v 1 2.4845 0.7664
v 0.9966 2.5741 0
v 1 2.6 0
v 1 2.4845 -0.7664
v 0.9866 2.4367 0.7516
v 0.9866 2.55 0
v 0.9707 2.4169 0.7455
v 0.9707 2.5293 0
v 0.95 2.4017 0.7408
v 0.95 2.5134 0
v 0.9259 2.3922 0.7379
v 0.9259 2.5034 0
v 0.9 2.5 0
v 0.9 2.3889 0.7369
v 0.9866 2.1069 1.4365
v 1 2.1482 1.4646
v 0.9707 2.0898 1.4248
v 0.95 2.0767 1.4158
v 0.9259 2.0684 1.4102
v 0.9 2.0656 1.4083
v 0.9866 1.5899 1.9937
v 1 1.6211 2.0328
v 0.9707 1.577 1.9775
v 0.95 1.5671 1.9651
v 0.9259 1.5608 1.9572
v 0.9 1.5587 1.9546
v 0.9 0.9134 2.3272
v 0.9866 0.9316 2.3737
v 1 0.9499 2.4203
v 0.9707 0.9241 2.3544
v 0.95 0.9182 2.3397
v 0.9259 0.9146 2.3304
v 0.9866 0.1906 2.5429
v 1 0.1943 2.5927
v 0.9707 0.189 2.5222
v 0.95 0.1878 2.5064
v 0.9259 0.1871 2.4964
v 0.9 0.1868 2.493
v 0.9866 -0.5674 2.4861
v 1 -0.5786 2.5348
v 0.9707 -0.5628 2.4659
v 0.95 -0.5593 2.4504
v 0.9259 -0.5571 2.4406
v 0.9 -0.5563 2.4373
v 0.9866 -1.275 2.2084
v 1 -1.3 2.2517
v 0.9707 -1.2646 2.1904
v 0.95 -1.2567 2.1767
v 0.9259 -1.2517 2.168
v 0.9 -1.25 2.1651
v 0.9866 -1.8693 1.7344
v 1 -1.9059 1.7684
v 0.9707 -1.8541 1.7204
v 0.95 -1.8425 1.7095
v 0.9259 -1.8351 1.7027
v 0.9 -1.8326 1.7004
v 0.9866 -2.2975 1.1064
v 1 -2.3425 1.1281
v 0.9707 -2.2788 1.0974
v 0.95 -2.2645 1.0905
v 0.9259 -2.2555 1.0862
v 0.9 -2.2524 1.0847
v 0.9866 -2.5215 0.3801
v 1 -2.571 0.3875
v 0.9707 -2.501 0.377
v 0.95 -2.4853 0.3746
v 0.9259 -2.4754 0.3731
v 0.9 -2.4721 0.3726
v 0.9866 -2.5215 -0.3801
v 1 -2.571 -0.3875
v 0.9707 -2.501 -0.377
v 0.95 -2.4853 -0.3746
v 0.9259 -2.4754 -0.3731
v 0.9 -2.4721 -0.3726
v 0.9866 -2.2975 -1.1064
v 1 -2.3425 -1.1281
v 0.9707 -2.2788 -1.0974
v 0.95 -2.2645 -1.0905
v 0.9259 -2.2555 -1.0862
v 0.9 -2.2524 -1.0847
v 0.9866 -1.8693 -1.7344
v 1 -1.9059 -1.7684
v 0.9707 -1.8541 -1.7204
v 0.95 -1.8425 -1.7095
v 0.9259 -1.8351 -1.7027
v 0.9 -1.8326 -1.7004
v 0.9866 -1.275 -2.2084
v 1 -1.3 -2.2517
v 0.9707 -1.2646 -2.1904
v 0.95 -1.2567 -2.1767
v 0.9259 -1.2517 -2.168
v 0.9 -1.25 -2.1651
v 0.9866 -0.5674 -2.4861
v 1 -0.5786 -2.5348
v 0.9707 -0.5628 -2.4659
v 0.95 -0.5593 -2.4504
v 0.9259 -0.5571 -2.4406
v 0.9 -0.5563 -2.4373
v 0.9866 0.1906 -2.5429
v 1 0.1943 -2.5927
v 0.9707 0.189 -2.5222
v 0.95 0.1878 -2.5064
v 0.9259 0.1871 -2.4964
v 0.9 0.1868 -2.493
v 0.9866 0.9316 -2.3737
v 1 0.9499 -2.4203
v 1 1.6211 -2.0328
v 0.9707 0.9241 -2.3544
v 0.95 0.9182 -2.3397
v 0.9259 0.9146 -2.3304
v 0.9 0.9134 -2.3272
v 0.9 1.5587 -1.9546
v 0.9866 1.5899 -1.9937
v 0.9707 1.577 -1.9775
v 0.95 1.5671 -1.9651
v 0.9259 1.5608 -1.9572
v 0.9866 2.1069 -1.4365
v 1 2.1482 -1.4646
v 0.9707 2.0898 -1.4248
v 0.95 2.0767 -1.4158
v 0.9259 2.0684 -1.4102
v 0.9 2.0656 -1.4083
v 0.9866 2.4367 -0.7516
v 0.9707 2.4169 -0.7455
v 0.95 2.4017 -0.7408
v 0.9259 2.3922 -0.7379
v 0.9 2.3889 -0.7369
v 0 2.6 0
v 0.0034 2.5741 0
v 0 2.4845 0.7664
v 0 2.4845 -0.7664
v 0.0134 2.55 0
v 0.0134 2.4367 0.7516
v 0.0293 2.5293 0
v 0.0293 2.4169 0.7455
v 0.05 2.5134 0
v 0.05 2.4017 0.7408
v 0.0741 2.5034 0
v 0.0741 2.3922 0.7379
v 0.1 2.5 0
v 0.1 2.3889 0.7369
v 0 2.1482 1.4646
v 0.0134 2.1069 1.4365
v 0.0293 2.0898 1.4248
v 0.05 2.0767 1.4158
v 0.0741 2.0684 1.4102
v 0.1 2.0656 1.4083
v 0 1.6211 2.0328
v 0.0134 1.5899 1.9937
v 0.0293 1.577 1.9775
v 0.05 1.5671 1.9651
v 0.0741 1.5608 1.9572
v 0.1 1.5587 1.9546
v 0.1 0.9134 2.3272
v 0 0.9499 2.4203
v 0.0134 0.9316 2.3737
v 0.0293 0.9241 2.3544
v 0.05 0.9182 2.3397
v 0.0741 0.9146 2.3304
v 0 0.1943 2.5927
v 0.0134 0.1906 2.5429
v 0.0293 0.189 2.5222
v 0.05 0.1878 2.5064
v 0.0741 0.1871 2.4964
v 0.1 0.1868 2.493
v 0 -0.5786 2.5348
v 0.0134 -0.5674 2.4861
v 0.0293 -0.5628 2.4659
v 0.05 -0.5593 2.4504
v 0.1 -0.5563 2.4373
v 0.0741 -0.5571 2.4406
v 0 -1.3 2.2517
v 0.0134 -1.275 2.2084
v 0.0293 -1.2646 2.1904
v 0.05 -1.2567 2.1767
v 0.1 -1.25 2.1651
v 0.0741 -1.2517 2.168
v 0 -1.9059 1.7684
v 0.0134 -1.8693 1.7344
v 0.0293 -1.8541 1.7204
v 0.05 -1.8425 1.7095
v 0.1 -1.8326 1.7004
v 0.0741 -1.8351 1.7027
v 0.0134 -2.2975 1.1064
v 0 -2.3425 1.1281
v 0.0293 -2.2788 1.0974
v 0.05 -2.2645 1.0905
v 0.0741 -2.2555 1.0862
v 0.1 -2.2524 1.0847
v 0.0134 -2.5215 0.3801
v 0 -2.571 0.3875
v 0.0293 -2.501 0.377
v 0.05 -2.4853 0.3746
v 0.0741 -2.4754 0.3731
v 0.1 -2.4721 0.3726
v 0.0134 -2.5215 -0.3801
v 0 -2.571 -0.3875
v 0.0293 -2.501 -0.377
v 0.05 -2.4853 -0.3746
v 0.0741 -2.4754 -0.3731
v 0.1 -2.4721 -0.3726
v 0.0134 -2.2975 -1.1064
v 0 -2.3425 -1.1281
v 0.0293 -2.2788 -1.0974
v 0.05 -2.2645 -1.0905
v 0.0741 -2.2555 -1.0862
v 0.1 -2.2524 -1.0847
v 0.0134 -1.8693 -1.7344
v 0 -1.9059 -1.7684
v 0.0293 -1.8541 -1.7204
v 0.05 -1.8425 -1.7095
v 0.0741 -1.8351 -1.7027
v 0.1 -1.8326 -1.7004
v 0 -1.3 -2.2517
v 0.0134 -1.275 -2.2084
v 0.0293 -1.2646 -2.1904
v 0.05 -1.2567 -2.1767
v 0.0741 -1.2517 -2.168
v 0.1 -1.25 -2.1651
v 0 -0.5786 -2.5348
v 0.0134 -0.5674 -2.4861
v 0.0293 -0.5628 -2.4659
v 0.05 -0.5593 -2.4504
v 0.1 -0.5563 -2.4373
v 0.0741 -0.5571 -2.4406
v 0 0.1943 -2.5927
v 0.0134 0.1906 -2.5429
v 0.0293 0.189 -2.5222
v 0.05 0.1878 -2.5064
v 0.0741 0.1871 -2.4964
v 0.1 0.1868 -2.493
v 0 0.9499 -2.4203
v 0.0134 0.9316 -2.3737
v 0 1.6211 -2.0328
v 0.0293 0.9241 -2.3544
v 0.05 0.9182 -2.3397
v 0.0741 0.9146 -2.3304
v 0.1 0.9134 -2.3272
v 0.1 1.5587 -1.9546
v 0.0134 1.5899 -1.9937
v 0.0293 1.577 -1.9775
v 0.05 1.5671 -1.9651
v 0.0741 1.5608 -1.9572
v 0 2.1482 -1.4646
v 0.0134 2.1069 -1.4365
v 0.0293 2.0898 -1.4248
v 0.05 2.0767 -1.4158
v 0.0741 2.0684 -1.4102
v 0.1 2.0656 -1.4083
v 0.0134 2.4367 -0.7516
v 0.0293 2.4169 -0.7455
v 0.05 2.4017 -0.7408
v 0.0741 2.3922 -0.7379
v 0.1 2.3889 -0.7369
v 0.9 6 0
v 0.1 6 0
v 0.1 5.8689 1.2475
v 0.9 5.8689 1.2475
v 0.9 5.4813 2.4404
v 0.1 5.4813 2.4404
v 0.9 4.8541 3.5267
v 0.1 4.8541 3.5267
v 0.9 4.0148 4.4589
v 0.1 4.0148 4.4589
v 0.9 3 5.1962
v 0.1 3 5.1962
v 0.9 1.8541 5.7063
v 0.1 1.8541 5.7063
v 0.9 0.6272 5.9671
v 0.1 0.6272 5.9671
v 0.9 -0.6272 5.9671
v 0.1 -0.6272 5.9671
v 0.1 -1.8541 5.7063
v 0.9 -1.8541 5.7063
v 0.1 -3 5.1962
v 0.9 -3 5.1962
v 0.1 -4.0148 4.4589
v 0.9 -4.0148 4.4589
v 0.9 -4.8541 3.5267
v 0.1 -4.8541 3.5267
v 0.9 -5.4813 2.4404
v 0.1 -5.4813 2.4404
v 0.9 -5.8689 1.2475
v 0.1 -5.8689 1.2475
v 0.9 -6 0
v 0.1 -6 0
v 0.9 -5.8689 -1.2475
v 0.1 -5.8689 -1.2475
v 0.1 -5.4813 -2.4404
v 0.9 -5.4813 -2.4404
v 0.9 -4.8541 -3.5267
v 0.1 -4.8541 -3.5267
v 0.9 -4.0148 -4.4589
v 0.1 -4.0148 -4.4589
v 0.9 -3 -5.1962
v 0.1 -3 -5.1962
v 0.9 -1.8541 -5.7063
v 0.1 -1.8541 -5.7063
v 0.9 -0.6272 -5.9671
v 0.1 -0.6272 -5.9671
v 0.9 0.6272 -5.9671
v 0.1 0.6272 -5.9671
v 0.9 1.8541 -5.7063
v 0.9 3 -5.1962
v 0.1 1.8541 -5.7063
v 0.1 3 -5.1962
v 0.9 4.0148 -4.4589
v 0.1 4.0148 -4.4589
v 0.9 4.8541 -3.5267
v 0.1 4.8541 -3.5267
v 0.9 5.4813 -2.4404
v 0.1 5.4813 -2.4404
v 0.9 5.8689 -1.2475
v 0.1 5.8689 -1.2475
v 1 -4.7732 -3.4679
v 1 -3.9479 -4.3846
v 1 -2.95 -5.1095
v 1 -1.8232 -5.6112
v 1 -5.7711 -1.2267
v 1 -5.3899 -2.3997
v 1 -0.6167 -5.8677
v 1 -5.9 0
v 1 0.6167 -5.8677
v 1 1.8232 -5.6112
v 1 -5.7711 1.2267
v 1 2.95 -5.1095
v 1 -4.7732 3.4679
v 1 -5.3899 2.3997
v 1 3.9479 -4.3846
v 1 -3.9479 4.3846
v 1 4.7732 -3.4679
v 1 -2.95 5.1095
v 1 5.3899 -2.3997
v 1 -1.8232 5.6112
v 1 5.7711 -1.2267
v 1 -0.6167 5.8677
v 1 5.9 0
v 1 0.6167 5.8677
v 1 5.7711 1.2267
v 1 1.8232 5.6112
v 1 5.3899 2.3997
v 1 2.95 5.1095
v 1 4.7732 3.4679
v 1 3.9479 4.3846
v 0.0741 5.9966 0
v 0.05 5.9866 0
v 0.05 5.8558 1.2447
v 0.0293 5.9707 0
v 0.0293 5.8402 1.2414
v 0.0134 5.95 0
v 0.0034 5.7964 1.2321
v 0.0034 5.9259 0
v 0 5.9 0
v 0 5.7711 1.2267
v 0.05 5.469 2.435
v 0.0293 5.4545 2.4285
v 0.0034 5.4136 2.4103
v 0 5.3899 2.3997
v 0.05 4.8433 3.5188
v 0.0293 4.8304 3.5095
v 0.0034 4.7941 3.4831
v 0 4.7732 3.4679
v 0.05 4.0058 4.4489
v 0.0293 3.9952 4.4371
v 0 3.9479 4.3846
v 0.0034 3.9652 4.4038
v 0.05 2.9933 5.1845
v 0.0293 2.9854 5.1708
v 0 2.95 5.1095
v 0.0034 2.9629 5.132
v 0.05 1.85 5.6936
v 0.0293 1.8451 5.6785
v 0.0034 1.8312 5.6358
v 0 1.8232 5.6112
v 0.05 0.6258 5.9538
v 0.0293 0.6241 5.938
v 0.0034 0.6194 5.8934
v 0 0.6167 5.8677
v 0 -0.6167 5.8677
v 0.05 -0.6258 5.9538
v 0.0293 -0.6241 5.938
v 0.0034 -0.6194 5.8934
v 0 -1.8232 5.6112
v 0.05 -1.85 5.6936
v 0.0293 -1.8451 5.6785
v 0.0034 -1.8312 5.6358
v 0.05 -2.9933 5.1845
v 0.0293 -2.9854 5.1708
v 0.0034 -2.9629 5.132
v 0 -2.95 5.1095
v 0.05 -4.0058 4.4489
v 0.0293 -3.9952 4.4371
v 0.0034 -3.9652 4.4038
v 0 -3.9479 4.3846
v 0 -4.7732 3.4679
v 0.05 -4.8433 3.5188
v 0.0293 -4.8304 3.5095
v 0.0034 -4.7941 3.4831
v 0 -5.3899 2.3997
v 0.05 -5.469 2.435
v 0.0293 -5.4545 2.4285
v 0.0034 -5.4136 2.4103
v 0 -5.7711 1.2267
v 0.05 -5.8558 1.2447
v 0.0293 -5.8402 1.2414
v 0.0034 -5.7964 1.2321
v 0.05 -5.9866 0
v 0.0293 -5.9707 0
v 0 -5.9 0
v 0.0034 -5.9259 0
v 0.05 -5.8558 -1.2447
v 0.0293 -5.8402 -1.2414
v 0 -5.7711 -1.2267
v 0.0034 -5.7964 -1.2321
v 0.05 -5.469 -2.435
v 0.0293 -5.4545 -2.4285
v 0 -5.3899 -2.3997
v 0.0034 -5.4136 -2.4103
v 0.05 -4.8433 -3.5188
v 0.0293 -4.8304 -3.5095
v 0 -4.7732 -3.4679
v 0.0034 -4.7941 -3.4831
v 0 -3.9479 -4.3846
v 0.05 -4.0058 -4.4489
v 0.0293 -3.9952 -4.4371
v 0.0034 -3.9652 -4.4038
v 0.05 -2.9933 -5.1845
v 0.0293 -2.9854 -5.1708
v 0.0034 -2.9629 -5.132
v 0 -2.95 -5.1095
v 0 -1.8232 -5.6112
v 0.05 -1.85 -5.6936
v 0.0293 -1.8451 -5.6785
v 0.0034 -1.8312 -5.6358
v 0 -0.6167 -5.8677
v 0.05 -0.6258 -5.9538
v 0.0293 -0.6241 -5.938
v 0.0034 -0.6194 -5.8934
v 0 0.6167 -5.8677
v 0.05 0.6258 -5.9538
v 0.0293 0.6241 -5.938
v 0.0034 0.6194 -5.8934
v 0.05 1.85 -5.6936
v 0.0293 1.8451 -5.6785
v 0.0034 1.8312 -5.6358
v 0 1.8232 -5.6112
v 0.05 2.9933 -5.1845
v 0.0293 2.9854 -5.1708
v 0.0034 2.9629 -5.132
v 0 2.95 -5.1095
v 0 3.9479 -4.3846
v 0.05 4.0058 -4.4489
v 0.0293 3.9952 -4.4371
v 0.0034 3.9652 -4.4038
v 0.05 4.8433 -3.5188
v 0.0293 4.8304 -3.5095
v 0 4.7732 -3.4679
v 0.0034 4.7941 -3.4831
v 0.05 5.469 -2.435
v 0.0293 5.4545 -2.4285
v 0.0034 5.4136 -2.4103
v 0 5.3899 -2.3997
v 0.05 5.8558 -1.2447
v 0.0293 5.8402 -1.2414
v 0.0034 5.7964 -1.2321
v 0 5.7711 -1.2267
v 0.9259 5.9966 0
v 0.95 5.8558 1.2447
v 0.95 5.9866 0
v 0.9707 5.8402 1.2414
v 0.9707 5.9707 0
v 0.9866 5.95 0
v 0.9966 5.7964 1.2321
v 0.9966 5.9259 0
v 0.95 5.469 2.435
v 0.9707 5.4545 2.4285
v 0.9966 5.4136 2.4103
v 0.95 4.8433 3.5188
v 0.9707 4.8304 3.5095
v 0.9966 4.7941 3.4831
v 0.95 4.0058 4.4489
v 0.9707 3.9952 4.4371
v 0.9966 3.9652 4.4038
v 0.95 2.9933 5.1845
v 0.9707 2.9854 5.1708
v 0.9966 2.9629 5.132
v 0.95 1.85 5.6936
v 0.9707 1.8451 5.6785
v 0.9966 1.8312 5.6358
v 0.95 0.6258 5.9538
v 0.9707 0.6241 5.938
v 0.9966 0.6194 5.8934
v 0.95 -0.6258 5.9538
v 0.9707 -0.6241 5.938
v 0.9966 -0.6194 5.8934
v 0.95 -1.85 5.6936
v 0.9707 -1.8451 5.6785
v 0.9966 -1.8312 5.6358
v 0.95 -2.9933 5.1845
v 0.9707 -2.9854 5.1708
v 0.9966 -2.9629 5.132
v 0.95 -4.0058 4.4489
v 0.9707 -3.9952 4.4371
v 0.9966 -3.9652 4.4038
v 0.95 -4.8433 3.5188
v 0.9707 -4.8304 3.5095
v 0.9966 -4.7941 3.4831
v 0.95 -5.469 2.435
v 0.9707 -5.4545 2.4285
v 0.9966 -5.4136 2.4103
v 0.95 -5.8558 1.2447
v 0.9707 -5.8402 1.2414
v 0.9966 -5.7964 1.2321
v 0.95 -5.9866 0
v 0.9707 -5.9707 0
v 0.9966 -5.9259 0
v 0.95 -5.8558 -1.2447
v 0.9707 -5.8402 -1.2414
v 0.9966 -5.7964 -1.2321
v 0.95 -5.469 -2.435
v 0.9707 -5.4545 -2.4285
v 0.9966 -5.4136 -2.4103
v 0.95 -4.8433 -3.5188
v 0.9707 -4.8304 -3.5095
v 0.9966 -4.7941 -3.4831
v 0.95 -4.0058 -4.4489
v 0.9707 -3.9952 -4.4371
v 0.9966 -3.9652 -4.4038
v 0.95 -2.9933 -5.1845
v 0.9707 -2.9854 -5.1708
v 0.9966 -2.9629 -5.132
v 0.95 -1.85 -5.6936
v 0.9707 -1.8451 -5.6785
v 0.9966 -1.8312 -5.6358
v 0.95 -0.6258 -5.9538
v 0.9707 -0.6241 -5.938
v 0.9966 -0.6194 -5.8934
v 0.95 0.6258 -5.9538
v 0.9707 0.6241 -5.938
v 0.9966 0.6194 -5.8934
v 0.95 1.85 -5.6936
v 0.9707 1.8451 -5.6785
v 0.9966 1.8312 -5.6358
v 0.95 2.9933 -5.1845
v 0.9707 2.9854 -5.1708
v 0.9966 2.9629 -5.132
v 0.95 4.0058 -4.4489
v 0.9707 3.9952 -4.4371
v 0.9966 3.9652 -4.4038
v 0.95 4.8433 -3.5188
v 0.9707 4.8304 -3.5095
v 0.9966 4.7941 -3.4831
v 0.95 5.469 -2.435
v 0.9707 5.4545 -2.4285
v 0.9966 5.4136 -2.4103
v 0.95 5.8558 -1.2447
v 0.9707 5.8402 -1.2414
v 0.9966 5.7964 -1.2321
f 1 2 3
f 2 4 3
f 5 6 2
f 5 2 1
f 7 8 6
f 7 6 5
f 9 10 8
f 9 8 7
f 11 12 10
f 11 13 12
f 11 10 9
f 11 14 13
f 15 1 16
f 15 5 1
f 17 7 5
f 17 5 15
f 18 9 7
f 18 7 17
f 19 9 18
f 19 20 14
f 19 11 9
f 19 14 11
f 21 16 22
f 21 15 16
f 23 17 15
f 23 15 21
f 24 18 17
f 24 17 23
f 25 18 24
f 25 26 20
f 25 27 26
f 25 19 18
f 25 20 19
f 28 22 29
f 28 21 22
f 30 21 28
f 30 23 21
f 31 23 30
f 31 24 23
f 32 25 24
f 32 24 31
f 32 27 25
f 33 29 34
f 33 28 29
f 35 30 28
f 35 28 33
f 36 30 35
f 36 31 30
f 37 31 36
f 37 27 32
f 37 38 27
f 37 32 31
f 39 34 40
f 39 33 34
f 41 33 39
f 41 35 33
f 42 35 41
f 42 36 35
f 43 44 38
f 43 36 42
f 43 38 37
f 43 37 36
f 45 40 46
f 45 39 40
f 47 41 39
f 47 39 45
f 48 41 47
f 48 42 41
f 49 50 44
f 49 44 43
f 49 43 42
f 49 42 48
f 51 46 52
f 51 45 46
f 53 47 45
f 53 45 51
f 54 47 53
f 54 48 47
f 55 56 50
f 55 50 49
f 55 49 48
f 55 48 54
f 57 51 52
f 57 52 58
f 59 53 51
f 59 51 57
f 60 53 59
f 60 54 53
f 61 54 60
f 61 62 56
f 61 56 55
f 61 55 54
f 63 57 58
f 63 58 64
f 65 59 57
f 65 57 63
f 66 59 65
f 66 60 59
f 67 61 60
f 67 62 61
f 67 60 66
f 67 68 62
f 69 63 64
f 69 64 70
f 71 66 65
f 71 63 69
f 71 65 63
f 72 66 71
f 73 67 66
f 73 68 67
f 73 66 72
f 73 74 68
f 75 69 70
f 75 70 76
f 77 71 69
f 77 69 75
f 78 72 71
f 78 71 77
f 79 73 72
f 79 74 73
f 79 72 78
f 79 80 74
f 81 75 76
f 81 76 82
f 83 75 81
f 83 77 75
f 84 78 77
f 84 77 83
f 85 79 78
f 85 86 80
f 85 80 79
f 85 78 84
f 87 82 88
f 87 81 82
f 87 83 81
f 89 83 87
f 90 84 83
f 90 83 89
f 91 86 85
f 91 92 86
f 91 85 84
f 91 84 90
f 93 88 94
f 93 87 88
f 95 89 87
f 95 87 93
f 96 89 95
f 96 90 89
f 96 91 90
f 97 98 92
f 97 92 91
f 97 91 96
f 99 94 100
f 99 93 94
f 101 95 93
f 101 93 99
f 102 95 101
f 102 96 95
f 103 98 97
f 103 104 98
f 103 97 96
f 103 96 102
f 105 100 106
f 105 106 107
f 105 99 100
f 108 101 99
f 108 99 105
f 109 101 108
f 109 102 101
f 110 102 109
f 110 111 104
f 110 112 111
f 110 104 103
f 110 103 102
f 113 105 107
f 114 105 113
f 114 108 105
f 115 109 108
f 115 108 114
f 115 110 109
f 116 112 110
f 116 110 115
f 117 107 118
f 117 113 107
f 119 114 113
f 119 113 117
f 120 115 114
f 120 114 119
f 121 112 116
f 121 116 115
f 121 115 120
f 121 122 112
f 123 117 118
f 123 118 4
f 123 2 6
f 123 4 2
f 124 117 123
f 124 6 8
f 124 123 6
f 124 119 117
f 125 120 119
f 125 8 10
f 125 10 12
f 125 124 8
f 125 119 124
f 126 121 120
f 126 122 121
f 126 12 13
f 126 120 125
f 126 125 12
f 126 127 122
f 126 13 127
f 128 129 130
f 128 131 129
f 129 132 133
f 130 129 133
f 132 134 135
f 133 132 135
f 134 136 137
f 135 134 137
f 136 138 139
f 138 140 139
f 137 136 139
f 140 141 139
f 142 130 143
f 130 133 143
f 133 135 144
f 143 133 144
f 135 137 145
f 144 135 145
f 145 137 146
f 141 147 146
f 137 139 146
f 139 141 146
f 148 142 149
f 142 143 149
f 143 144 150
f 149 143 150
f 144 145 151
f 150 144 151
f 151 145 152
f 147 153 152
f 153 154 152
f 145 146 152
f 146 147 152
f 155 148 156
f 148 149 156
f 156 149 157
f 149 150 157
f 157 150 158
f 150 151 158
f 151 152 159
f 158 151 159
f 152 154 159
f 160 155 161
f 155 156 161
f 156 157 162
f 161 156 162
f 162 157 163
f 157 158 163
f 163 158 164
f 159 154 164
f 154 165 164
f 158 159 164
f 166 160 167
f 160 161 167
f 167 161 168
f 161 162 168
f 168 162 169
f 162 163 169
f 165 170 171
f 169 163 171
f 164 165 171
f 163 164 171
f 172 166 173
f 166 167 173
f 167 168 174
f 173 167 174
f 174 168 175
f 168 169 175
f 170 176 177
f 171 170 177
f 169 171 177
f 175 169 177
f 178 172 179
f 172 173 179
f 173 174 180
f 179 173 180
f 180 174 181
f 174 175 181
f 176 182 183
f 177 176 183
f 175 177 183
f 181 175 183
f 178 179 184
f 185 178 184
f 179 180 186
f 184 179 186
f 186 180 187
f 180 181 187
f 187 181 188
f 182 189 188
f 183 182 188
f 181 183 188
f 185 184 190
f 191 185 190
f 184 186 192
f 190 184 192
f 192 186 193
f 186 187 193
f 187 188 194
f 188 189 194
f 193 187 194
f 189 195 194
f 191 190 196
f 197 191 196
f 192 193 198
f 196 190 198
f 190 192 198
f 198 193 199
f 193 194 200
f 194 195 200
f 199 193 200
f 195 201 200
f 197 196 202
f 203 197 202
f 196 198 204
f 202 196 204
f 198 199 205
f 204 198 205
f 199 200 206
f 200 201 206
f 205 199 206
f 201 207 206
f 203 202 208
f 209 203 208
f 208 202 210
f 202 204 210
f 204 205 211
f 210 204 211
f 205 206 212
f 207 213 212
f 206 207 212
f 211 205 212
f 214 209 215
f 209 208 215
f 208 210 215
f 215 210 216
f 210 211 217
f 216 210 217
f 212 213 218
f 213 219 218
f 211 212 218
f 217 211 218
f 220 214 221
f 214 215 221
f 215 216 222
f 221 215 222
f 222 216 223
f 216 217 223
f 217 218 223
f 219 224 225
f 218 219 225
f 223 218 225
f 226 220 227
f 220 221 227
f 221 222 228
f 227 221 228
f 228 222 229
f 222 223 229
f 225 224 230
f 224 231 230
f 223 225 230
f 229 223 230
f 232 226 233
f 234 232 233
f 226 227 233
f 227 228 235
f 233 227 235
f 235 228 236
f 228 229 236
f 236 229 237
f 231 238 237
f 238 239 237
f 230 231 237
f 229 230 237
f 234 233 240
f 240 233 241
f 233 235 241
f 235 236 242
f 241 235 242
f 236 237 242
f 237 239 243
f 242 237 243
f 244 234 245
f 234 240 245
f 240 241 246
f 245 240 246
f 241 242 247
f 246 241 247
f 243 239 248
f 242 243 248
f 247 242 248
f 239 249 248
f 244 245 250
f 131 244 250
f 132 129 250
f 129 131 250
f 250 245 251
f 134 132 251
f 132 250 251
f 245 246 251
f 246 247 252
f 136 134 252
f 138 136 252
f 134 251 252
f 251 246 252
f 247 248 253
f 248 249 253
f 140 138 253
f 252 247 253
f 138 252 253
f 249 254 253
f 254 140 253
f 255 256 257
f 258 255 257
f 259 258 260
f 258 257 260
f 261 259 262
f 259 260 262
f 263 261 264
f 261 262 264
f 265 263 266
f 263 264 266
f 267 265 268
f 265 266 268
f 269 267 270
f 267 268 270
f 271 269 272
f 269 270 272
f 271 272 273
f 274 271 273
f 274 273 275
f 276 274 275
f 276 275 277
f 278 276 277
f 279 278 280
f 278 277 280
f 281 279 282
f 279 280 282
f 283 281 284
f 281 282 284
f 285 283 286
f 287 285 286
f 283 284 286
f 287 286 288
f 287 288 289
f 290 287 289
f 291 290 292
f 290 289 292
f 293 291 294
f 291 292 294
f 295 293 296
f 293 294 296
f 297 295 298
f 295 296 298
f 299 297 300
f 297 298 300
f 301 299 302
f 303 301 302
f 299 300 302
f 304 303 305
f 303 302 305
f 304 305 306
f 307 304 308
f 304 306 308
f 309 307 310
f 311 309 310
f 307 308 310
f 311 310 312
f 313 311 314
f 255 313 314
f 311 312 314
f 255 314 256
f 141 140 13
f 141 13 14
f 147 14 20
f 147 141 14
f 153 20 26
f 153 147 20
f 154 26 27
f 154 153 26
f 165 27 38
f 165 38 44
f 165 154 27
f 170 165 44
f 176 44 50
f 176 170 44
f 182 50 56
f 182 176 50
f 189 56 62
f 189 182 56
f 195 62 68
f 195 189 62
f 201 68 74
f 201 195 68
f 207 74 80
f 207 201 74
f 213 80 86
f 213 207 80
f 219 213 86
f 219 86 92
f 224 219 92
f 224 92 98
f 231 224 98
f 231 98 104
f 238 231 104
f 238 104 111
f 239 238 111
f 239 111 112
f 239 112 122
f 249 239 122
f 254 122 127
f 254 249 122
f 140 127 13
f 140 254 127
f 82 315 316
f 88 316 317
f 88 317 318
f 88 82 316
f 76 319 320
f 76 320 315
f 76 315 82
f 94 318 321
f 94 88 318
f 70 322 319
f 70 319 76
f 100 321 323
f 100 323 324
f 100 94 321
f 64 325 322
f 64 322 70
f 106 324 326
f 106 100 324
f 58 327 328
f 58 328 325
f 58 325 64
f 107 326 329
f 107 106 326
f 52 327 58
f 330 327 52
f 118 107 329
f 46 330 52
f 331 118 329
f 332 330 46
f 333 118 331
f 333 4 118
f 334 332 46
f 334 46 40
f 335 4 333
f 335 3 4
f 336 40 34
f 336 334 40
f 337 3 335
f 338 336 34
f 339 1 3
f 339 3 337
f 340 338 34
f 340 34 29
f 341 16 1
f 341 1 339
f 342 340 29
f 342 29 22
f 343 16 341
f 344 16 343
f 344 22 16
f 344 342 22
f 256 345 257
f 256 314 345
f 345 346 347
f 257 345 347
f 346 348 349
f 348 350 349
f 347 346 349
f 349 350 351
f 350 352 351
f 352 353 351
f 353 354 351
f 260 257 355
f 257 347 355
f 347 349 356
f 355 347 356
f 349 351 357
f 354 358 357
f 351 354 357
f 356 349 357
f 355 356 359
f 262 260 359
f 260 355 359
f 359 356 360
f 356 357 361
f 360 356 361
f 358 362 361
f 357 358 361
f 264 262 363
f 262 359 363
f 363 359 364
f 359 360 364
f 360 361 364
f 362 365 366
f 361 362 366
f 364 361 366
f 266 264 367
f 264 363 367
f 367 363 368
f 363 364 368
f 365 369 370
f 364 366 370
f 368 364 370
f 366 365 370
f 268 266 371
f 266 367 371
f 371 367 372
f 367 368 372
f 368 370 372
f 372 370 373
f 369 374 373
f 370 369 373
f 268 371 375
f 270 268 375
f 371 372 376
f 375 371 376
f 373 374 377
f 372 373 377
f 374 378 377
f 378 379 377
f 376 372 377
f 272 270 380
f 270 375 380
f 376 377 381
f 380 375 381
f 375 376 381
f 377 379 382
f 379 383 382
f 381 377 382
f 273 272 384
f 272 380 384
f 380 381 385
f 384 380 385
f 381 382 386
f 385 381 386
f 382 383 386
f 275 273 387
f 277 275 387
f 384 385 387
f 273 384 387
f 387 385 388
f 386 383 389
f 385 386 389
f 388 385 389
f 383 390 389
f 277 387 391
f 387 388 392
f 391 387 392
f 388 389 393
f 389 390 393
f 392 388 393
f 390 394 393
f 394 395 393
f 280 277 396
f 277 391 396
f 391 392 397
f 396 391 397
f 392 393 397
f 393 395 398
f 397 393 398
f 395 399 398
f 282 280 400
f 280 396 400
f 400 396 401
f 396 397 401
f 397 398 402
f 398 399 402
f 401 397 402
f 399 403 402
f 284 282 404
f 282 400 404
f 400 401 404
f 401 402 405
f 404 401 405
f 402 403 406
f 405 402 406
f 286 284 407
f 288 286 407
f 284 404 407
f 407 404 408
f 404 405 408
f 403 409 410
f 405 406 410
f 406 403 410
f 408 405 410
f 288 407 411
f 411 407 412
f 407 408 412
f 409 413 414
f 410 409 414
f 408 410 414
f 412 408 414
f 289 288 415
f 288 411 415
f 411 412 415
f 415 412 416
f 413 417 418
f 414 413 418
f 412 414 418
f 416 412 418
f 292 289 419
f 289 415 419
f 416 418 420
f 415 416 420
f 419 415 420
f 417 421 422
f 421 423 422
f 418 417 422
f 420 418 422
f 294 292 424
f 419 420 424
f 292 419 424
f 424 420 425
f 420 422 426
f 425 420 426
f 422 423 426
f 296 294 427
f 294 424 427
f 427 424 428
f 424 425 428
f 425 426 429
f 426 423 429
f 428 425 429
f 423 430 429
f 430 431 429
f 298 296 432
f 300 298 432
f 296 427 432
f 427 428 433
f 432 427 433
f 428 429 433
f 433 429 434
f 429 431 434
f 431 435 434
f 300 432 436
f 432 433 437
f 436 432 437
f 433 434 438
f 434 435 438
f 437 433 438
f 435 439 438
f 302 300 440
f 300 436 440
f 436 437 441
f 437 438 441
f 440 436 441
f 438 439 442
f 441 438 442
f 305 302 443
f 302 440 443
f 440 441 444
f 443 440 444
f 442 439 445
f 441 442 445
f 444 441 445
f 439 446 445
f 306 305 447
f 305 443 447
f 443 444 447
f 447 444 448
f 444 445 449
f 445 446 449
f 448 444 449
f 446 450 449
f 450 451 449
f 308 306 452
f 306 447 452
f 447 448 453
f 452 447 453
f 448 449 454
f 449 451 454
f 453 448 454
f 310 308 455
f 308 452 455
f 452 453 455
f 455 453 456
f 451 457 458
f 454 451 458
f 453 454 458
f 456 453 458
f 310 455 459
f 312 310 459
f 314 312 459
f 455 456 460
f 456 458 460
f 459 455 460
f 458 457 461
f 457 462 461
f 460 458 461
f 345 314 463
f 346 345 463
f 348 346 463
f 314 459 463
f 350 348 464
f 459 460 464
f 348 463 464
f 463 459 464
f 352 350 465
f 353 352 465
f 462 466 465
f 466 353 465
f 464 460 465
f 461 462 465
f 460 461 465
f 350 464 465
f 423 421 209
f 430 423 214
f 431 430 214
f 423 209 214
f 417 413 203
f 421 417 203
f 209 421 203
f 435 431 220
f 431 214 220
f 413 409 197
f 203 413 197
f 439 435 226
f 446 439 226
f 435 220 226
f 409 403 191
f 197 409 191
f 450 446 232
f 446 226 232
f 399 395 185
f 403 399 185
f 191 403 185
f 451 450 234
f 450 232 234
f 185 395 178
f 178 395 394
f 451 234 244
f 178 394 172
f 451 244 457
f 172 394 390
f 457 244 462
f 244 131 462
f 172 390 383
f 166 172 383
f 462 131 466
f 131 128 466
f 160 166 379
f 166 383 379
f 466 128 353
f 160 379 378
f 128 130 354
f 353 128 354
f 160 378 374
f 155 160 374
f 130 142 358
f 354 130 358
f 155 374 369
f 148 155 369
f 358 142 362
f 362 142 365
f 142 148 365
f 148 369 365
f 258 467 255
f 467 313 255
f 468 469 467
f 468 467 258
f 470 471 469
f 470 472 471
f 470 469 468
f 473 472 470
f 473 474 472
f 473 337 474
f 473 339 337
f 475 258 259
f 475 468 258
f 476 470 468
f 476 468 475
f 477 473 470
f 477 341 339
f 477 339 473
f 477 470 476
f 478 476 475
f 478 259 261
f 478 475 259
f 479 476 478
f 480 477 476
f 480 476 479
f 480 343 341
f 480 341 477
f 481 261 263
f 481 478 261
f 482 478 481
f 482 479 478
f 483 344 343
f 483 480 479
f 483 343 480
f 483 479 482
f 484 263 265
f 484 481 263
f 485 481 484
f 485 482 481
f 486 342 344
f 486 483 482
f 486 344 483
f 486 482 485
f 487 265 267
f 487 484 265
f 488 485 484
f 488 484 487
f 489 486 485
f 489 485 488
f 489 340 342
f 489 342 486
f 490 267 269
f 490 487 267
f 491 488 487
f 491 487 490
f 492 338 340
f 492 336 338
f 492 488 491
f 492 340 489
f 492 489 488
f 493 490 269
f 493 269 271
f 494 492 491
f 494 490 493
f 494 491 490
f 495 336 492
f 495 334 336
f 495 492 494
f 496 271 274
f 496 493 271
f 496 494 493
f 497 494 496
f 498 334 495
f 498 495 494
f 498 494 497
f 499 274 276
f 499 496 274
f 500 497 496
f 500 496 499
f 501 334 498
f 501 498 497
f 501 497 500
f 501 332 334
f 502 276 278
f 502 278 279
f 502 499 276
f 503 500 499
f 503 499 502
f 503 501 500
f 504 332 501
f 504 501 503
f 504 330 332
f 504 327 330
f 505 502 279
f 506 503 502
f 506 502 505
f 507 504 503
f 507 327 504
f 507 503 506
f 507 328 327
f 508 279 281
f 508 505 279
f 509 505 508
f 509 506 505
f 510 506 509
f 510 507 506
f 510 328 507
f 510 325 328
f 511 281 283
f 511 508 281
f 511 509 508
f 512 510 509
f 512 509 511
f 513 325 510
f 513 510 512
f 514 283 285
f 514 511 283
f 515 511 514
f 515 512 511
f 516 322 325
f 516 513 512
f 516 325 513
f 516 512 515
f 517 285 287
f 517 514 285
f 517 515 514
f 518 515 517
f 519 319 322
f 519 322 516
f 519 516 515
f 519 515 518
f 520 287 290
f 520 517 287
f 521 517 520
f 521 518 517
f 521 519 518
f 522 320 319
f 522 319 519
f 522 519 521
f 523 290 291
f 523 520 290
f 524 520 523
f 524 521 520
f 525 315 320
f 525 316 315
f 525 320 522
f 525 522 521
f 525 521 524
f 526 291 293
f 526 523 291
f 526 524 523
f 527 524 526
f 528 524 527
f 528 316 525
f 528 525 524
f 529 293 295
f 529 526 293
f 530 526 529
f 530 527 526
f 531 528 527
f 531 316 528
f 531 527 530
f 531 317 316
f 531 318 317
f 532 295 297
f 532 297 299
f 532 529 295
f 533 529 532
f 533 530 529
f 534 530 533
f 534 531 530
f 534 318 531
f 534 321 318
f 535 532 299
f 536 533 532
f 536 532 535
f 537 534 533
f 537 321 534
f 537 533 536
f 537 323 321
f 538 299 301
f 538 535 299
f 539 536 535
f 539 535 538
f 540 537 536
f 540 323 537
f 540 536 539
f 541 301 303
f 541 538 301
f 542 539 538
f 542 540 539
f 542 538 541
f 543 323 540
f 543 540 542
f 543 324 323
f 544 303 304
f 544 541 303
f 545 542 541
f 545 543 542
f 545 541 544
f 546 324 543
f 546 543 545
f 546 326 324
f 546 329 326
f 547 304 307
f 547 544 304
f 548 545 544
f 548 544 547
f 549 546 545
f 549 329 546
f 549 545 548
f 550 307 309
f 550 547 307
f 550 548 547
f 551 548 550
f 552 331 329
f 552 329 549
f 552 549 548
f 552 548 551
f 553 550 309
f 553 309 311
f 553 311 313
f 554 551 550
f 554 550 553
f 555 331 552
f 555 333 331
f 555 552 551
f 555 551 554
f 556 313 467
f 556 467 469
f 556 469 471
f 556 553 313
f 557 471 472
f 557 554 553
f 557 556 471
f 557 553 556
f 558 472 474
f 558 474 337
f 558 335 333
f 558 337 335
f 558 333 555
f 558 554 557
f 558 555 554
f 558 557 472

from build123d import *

# Parameters (mm, degrees)
F0_R     = 6
F0_R_2   = 2.5
F1_DEPTH = 1
F2_R     = 0.1
F3_R     = 0.1


with BuildPart() as f1:
    # F0 (on Right) → F1 (new body)
    with BuildSketch(Plane.YZ):
        Circle(F0_R)
        Circle(F0_R_2, mode=Mode.SUBTRACT)
    extrude(amount=F1_DEPTH)

    # F2
    f2_edges = [f1.edges().sort_by_distance(p)[0] for p in [
        (1, -6, 0),
        (0, -6, 0),
    ]]
    fillet(f2_edges, radius=F2_R)

    # F3
    f3_edges = [f1.edges().sort_by_distance(p)[0] for p in [
        (0, -2.5, 0),
        (1, -2.5, 0),
    ]]
    fillet(f3_edges, radius=F3_R)


solid = f1.part
